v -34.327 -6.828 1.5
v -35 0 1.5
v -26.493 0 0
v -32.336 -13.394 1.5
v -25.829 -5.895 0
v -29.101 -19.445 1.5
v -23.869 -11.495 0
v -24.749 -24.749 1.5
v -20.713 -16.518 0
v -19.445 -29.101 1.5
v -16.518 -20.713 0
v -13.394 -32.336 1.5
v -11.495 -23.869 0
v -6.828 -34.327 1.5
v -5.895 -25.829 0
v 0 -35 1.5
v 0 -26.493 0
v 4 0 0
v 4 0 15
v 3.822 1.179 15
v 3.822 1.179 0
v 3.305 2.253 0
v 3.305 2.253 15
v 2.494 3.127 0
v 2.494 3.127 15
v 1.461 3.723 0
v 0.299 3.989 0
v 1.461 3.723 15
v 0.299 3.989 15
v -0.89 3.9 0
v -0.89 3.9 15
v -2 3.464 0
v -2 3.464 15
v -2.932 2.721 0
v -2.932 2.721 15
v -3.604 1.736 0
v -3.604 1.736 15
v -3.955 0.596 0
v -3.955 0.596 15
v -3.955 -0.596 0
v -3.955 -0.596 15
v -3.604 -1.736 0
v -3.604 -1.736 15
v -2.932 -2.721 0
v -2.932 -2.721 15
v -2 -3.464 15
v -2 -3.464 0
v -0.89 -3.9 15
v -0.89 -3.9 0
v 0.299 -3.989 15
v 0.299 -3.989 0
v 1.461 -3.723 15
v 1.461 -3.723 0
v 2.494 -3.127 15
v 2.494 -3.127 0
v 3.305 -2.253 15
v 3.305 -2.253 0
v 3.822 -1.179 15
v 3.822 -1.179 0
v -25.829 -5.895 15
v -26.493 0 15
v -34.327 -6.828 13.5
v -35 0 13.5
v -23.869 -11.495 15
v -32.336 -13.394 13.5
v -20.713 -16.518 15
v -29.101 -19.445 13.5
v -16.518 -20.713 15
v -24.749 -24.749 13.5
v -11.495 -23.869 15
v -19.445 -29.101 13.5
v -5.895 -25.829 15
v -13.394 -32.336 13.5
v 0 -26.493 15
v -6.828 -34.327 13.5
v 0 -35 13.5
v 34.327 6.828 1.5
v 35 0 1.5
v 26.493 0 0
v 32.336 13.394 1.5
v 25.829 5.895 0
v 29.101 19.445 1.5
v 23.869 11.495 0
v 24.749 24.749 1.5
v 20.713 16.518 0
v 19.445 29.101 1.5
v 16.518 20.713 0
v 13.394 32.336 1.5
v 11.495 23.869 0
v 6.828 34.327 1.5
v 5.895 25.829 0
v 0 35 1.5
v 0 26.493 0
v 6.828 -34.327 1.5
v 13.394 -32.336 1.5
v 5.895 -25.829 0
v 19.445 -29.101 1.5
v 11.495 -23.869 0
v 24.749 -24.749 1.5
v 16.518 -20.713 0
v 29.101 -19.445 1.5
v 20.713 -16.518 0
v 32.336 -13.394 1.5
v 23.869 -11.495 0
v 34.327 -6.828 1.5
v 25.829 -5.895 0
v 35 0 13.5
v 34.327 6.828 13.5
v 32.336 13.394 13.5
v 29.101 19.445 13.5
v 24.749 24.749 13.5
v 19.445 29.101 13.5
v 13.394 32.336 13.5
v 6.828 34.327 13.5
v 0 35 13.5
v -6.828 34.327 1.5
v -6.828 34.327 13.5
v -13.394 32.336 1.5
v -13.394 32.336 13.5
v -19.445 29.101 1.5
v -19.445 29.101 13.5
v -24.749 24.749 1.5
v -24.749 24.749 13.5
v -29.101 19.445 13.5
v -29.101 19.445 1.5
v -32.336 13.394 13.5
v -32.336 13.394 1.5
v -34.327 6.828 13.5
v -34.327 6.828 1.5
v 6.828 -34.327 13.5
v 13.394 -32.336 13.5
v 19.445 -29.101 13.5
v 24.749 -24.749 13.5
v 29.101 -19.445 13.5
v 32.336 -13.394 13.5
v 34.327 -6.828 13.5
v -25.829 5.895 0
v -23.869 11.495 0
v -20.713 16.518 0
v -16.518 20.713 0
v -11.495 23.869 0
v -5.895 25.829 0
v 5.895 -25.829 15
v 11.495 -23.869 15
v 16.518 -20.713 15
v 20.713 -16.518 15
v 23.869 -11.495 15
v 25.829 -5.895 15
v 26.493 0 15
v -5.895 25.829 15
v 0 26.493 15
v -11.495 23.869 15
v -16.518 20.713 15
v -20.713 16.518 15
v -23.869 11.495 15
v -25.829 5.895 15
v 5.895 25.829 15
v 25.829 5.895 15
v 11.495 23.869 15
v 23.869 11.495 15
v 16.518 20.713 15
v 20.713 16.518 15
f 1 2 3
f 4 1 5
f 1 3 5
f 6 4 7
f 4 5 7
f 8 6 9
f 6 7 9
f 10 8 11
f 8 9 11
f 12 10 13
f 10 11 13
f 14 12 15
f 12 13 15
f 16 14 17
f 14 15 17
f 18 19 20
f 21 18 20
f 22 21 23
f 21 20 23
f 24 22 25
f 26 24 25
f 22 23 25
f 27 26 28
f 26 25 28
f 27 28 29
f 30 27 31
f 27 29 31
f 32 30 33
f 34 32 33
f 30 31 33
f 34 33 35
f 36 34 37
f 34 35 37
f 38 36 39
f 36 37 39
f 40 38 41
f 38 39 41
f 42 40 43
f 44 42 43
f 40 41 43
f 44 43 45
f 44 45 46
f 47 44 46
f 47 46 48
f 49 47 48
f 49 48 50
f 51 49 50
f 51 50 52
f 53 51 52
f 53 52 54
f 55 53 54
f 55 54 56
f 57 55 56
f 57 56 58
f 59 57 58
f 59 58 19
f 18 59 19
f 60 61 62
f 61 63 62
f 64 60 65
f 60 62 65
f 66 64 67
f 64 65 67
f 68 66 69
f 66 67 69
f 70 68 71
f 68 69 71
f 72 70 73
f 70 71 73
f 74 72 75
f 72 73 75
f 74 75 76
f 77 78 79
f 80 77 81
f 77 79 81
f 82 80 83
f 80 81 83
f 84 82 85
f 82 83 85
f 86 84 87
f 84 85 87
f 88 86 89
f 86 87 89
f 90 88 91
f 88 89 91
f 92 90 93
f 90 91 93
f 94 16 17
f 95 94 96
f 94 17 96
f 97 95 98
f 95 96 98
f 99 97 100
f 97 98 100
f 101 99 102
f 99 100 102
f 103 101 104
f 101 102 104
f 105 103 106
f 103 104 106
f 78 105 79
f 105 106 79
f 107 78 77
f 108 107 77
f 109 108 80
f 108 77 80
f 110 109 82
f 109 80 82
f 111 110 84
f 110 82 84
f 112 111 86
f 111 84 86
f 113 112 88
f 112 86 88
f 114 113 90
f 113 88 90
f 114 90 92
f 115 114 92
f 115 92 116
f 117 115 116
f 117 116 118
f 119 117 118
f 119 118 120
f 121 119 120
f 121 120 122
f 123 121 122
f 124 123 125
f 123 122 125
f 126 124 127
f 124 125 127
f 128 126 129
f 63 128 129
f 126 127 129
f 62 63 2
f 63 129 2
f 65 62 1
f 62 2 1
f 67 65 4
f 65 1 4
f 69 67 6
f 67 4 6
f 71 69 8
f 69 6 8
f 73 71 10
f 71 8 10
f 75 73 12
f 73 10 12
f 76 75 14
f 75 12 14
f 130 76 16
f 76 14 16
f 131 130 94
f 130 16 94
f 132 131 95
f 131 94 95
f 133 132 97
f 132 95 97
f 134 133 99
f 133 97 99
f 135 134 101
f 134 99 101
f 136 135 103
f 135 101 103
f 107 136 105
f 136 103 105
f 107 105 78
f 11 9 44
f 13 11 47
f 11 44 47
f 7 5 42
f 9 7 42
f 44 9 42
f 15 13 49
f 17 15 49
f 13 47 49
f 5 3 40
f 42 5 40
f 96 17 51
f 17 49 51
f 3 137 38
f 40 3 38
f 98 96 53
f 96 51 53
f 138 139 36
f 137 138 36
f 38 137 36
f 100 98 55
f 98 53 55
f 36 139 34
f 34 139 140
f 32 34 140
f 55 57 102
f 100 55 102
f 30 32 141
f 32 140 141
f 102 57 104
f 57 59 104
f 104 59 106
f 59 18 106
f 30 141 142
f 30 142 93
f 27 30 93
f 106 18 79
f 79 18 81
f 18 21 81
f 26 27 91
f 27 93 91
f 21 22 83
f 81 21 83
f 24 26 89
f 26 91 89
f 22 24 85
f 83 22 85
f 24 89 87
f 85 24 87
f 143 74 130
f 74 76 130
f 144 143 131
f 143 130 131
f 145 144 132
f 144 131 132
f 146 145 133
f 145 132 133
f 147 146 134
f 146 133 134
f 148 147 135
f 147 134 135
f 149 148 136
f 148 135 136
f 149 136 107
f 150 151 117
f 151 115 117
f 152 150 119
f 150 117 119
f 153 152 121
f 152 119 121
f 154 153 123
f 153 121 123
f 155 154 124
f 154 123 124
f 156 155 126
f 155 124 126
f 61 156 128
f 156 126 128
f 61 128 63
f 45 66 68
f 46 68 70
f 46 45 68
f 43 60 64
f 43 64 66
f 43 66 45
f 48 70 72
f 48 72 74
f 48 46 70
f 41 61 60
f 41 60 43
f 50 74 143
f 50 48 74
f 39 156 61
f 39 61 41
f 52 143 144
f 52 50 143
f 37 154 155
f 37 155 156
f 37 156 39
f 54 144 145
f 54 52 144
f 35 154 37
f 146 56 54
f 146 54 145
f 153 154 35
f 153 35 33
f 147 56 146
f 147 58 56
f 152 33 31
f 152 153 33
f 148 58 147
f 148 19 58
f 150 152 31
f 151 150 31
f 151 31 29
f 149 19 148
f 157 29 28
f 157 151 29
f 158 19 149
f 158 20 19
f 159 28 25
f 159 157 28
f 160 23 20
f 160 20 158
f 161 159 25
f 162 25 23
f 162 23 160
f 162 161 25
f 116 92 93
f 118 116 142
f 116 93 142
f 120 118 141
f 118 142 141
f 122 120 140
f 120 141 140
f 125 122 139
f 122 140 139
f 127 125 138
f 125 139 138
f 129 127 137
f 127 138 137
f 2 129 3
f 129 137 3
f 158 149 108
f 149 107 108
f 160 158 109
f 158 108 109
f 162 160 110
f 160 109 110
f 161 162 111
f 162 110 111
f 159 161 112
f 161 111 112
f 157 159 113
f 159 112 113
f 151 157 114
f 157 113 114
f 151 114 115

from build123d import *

# Parameters (mm, degrees)
SKETCH_2_R          = 35
EXTRUDE_1_DEPTH     = 15
SKETCH_5_R          = 4
CUT_EXTRUDE_1_DEPTH = 20


with BuildPart() as part:
    # 스케치2 → 보스-돌출1 (new body)
    with BuildSketch(Plane.XY):
        Circle(SKETCH_2_R)
    extrude(amount=EXTRUDE_1_DEPTH)

    # 스케치5 → 컷-돌출1 (cut)
    with BuildSketch(Plane.XY.offset(15)):
        Circle(SKETCH_5_R)
    extrude(amount=-CUT_EXTRUDE_1_DEPTH, mode=Mode.SUBTRACT)

    # 컷-스윕2: sweep along a curve in space
    with BuildLine() as sweep_2_path:
        ThreePointArc((35, 0, 0), (24.748737342, 24.748737342, 0), (0, 35, 0))
        ThreePointArc((0, 35, 0), (-24.748737342, 24.748737342, 0), (-35, 0, 0))
        ThreePointArc((-35, 0, 0), (-24.748737342, -24.748737342, 0), (0, -35, 0))
        ThreePointArc((0, -35, 0), (24.748737342, -24.748737342, 0), (35, 0, 0))
    # 스케치4 → 컷-스윕2 (sweep, cut)
    with BuildSketch(Plane(origin=(0, 0, 0), x_dir=(1, 0, 0), z_dir=(0, 1, 0))):
        Polygon((-35, -1.5), (-26.493077271, 0), (-35, 0), align=None)
        Polygon((-35, -15), (-26.493077271, -15), (-35, -13.5), align=None)
    sweep(path=sweep_2_path.line, mode=Mode.SUBTRACT)


solid = part.part
